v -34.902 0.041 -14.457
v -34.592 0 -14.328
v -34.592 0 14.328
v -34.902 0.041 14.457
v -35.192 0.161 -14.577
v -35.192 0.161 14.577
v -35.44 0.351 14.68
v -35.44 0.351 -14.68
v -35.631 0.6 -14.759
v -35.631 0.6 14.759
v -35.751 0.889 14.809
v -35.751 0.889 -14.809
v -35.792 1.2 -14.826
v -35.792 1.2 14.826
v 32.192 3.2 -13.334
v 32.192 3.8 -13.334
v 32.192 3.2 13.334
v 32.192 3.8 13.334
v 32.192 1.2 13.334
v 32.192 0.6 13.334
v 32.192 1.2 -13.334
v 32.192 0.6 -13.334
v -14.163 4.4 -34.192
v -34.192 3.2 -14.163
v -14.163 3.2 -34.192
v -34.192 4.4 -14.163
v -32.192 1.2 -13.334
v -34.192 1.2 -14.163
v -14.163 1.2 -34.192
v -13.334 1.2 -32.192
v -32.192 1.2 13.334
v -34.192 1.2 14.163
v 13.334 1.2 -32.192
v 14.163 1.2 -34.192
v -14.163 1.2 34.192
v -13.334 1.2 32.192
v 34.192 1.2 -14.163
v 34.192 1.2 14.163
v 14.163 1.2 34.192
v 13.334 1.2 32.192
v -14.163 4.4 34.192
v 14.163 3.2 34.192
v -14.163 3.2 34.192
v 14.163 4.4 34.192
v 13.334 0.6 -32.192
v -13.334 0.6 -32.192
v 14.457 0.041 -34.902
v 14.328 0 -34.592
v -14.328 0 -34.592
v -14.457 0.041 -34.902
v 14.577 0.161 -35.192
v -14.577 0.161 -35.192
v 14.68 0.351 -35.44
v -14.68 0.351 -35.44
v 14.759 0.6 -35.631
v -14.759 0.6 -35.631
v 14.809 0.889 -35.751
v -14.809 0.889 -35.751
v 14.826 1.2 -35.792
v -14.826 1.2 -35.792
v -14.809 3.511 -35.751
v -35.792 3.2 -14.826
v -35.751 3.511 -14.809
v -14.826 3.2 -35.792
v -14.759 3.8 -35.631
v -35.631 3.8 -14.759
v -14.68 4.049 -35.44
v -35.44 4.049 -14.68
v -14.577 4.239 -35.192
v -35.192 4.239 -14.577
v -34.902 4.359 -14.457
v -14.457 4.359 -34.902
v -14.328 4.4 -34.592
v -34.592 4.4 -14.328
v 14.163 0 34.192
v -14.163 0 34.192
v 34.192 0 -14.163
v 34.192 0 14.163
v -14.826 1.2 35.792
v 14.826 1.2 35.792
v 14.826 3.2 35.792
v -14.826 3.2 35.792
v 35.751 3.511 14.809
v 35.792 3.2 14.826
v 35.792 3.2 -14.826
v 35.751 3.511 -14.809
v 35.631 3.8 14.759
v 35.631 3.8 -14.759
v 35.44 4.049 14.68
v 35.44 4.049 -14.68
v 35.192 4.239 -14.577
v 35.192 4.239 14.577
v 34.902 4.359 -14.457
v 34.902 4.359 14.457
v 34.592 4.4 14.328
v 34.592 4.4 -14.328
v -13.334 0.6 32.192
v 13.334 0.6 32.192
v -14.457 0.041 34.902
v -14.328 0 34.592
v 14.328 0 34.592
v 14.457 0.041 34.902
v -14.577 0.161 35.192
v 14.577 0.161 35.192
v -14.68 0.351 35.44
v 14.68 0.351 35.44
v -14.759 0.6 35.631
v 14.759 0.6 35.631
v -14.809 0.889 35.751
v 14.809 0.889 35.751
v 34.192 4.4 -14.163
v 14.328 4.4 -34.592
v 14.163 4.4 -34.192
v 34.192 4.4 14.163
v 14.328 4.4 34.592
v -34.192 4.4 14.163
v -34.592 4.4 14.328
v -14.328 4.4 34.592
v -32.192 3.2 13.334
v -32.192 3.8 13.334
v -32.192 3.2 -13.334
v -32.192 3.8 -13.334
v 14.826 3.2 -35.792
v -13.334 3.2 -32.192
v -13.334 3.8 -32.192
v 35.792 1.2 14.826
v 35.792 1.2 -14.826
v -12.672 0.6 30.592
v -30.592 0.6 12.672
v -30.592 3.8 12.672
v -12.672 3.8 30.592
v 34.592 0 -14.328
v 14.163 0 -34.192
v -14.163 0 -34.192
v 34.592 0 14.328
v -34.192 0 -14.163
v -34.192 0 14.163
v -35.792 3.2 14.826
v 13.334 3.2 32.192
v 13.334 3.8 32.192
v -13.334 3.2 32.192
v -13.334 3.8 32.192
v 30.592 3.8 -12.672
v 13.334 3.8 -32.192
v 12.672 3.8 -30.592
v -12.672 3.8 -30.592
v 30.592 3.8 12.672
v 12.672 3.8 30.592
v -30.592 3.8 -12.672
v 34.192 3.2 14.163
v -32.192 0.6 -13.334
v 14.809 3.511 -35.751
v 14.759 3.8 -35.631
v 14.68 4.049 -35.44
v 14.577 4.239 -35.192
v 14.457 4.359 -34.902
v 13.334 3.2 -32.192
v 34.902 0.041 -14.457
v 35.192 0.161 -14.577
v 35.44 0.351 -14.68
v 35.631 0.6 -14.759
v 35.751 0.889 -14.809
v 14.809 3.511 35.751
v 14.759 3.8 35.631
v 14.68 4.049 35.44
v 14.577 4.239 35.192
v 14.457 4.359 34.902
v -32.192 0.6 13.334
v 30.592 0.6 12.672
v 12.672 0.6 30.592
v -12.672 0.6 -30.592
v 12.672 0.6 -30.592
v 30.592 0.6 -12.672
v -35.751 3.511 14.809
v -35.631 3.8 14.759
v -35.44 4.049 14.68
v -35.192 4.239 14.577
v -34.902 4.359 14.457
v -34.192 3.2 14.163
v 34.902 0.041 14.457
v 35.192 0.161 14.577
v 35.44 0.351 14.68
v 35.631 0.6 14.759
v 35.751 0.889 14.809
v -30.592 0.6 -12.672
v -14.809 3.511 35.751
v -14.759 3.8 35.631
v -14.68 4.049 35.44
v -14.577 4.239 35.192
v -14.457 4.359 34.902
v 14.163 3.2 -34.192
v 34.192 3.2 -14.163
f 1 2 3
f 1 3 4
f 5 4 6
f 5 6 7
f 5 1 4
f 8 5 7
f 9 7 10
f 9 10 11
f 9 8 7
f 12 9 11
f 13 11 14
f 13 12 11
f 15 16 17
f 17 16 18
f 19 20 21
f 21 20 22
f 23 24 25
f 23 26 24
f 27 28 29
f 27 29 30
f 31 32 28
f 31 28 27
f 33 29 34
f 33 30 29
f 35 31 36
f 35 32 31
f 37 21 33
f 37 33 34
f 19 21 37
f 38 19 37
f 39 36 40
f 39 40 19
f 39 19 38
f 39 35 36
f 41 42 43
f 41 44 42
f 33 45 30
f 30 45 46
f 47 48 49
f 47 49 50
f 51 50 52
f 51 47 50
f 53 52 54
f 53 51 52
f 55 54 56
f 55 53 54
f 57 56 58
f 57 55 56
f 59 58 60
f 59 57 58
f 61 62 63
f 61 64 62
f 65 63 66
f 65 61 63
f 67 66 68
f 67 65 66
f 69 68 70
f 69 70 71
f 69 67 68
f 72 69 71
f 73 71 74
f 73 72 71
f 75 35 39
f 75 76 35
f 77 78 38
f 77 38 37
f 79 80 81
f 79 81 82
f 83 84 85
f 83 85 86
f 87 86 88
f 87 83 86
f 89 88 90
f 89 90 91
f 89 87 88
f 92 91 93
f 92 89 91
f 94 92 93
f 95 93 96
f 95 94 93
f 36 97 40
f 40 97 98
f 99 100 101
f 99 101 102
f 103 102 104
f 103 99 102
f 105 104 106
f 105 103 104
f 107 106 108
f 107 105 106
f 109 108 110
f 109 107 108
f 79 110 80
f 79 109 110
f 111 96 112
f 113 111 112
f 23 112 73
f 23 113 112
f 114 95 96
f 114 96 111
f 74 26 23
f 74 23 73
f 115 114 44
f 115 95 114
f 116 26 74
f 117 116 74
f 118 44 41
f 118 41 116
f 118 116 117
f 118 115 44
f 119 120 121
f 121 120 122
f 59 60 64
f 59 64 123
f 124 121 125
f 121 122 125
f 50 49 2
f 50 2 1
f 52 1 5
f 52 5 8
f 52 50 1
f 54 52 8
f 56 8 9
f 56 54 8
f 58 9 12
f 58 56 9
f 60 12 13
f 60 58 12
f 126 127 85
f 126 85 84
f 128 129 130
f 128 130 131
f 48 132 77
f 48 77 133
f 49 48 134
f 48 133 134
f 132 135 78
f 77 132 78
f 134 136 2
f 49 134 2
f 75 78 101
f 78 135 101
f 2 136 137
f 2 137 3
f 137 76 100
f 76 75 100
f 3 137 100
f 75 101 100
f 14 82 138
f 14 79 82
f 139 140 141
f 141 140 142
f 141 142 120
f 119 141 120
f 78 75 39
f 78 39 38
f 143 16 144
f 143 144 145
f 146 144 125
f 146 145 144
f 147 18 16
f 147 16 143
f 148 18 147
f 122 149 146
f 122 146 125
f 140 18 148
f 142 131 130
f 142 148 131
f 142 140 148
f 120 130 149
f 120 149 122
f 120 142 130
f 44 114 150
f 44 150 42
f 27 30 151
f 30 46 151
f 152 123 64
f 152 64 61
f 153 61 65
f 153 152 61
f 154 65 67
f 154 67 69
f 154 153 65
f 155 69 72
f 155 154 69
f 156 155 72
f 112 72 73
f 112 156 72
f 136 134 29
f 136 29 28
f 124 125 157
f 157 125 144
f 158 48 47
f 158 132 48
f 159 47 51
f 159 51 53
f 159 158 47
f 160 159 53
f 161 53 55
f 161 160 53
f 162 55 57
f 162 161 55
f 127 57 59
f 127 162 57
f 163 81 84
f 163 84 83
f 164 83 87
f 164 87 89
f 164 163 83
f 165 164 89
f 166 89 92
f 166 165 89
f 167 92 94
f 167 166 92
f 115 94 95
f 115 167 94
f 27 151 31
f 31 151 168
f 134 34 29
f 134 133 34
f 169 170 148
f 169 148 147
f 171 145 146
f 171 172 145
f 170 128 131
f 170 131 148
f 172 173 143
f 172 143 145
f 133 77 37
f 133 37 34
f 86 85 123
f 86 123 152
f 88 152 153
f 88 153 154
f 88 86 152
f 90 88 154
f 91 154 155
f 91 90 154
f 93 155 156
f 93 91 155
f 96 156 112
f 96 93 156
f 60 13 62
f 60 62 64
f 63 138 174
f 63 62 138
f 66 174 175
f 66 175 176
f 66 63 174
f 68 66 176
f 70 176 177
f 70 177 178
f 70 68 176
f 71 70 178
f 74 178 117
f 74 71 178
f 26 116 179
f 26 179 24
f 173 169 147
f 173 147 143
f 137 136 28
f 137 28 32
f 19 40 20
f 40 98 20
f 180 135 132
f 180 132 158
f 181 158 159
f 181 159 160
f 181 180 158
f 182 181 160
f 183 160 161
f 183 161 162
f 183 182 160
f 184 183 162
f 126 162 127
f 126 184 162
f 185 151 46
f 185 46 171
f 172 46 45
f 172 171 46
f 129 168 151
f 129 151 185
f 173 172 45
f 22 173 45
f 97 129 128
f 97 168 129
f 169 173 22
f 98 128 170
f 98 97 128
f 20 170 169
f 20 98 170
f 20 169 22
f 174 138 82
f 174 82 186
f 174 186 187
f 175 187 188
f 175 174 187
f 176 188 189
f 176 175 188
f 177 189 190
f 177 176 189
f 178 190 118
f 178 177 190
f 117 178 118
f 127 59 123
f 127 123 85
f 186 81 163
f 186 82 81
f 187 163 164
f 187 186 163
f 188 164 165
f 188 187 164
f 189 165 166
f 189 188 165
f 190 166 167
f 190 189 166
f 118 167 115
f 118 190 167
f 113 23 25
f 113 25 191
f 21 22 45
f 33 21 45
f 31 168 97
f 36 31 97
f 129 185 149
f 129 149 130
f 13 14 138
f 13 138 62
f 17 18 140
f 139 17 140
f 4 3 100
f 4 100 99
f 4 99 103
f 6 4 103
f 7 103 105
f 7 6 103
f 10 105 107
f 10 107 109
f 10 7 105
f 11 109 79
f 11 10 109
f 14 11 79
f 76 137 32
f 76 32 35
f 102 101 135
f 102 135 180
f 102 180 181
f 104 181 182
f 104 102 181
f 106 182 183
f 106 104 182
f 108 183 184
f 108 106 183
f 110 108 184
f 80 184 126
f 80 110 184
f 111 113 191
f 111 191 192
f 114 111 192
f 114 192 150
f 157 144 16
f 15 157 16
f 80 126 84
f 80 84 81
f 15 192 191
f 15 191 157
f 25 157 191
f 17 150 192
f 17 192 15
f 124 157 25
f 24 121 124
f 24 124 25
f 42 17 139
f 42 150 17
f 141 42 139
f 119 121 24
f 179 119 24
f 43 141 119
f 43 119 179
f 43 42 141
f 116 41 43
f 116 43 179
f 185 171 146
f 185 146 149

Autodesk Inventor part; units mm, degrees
ref_plane "YZ Plane" through (0, 0, 0) normal (1, 0, 0) x (0, 1, 0)
ref_plane "XZ Plane" through (0, 0, 0) normal (0, 1, 0) x (-1, 0, 0)
sketch "스케치1" plane through (0, 0, 0) normal (0, 1, 0) x (-1, 0, 0)
  line L0 (-32.5919, 13.5) -> (-13.5, 32.5919)
  line L1 (-13.5, 32.5919) -> (13.5, 32.5919)
  line L2 (13.5, 32.5919) -> (32.5919, 13.5)
  line L3 (32.5919, 13.5) -> (32.5919, -13.5)
  line L4 (32.5919, -13.5) -> (13.5, -32.5919)
  line L5 (13.5, -32.5919) -> (-13.5, -32.5919)
  line L6 (-13.5, -32.5919) -> (-32.5919, -13.5)
  line L7 (-32.5919, -13.5) -> (-32.5919, 13.5)
  line L8 (35.7919, 14.8255) -> (35.7919, -14.8255)
  line L9 (35.7919, -14.8255) -> (14.8255, -35.7919)
  line L10 (14.8255, -35.7919) -> (-14.8255, -35.7919)
  line L11 (-14.8255, -35.7919) -> (-35.7919, -14.8255)
  line L12 (-35.7919, -14.8255) -> (-35.7919, 14.8255)
  line L13 (-35.7919, 14.8255) -> (-14.8255, 35.7919)
  line L14 (-14.8255, 35.7919) -> (14.8255, 35.7919)
  line L15 (14.8255, 35.7919) -> (35.7919, 14.8255)
  point P0 (0, 0)
  point P1 (0, 0)
  point P2 (0, 0)
  dimension "d0" = 27
  dimension "d1" = 3.2
extrude "돌출1" add sketch "스케치1" along normal blind 4.4 contours L0 L1 L2 L3 L4 L5 L6 L7 | L8 L9 L10 L11 L12 L13 L14 L15
sketch "스케치3" plane through (0, 0, 0) normal (0, -1, 0) x (1, 0, 0)
  line L0 (-13.3343, 32.1919) -> (13.3343, 32.1919)
  line L1 (13.3343, 32.1919) -> (32.1919, 13.3343)
  line L2 (32.1919, 13.3343) -> (32.1919, -13.3343)
  line L3 (32.1919, -13.3343) -> (13.3343, -32.1919)
  line L4 (13.3343, -32.1919) -> (-13.3343, -32.1919)
  line L5 (-13.3343, -32.1919) -> (-32.1919, -13.3343)
  line L6 (-32.1919, -13.3343) -> (-32.1919, 13.3343)
  line L7 (-32.1919, 13.3343) -> (-13.3343, 32.1919)
  line L8 (-14.1627, 34.1919) -> (14.1627, 34.1919)
  line L9 (14.1627, 34.1919) -> (34.1919, 14.1627)
  line L10 (34.1919, 14.1627) -> (34.1919, -14.1627)
  line L11 (34.1919, -14.1627) -> (14.1627, -34.1919)
  line L12 (14.1627, -34.1919) -> (-14.1627, -34.1919)
  line L13 (-14.1627, -34.1919) -> (-34.1919, -14.1627)
  line L14 (-34.1919, -14.1627) -> (-34.1919, 14.1627)
  line L15 (-34.1919, 14.1627) -> (-14.1627, 34.1919)
  line L16 (-14.8255, 35.7919) -> (14.8255, 35.7919) projected
  point P0 (0, 0)
  point P1 (0, 0)
  point P2 (0, 0)
  point P3 (0, 0)
  dimension "d9" = 2
  dimension "d144" = 1.6
extrude "돌출3" cut sketch "스케치3" against normal blind 1.2
sketch "스케치14" plane through (0, 0, 0) normal (0, -1, 0) x (1, 0, 0)
  line L0 (32.1919, 13.3343) -> (13.3343, 32.1919) projected
  line L1 (13.3343, 32.1919) -> (-13.3343, 32.1919) projected
  line L2 (-13.3343, 32.1919) -> (-32.1919, 13.3343) projected
  line L3 (-32.1919, 13.3343) -> (-32.1919, -13.3343) projected
  line L4 (-32.1919, -13.3343) -> (-13.3343, -32.1919) projected
  line L5 (-13.3343, -32.1919) -> (13.3343, -32.1919) projected
  line L6 (13.3343, -32.1919) -> (32.1919, -13.3343) projected
  line L7 (32.1919, -13.3343) -> (32.1919, 13.3343) projected
  point P0 (0, 0)
extrude "돌출16" cut sketch "스케치14" against normal blind 0.6
sketch "스케치15" plane through (0, 0.6, 0) normal (0, -1, 0) x (1, 0, 0)
  line L0 (-12.6716, 30.5919) -> (12.6716, 30.5919)
  line L1 (12.6716, 30.5919) -> (30.5919, 12.6716)
  line L2 (30.5919, 12.6716) -> (30.5919, -12.6716)
  line L3 (30.5919, -12.6716) -> (12.6716, -30.5919)
  line L4 (12.6716, -30.5919) -> (-12.6716, -30.5919)
  line L5 (-12.6716, -30.5919) -> (-30.5919, -12.6716)
  line L6 (-30.5919, -12.6716) -> (-30.5919, 12.6716)
  line L7 (-30.5919, 12.6716) -> (-12.6716, 30.5919)
  line L8 (-13.3343, 32.1919) -> (13.3343, 32.1919) projected
  point P0 (0, 0)
  point P1 (0, 0)
  dimension "d140" = 1.6
extrude "돌출17" cut sketch "스케치15" against normal up to surface (3.8 mm away)
ref_plane "작업 평면3" through (0, 2.2, 0) normal (0, -1, 0) x (1, 0, 0)
mirror "미러6" about plane through (0, 2.2, 0) normal (0, -1, 0) of "돌출3", "돌출16"
fillet "모깎기2" radius 1.2 16 edges at (0, 0, 35.7919) (-25.3087, 0, 25.3087) (-35.7919, 0, 0) (-25.3087, 0, -25.3087) (0, 0, -35.7919) (25.3087, 0, -25.3087) (35.7919, 0, 0) (25.3087, 0, 25.3087) (-25.3087, 4.4, 25.3087) (-35.7919, 4.4, 0) (-25.3087, 4.4, -25.3087) (0, 4.4, -35.7919) (25.3087, 4.4, -25.3087) (35.7919, 4.4, 0) (25.3087, 4.4, 25.3087) (0, 4.4, 35.7919)
properties part number "OV-PAM_ring_2"
